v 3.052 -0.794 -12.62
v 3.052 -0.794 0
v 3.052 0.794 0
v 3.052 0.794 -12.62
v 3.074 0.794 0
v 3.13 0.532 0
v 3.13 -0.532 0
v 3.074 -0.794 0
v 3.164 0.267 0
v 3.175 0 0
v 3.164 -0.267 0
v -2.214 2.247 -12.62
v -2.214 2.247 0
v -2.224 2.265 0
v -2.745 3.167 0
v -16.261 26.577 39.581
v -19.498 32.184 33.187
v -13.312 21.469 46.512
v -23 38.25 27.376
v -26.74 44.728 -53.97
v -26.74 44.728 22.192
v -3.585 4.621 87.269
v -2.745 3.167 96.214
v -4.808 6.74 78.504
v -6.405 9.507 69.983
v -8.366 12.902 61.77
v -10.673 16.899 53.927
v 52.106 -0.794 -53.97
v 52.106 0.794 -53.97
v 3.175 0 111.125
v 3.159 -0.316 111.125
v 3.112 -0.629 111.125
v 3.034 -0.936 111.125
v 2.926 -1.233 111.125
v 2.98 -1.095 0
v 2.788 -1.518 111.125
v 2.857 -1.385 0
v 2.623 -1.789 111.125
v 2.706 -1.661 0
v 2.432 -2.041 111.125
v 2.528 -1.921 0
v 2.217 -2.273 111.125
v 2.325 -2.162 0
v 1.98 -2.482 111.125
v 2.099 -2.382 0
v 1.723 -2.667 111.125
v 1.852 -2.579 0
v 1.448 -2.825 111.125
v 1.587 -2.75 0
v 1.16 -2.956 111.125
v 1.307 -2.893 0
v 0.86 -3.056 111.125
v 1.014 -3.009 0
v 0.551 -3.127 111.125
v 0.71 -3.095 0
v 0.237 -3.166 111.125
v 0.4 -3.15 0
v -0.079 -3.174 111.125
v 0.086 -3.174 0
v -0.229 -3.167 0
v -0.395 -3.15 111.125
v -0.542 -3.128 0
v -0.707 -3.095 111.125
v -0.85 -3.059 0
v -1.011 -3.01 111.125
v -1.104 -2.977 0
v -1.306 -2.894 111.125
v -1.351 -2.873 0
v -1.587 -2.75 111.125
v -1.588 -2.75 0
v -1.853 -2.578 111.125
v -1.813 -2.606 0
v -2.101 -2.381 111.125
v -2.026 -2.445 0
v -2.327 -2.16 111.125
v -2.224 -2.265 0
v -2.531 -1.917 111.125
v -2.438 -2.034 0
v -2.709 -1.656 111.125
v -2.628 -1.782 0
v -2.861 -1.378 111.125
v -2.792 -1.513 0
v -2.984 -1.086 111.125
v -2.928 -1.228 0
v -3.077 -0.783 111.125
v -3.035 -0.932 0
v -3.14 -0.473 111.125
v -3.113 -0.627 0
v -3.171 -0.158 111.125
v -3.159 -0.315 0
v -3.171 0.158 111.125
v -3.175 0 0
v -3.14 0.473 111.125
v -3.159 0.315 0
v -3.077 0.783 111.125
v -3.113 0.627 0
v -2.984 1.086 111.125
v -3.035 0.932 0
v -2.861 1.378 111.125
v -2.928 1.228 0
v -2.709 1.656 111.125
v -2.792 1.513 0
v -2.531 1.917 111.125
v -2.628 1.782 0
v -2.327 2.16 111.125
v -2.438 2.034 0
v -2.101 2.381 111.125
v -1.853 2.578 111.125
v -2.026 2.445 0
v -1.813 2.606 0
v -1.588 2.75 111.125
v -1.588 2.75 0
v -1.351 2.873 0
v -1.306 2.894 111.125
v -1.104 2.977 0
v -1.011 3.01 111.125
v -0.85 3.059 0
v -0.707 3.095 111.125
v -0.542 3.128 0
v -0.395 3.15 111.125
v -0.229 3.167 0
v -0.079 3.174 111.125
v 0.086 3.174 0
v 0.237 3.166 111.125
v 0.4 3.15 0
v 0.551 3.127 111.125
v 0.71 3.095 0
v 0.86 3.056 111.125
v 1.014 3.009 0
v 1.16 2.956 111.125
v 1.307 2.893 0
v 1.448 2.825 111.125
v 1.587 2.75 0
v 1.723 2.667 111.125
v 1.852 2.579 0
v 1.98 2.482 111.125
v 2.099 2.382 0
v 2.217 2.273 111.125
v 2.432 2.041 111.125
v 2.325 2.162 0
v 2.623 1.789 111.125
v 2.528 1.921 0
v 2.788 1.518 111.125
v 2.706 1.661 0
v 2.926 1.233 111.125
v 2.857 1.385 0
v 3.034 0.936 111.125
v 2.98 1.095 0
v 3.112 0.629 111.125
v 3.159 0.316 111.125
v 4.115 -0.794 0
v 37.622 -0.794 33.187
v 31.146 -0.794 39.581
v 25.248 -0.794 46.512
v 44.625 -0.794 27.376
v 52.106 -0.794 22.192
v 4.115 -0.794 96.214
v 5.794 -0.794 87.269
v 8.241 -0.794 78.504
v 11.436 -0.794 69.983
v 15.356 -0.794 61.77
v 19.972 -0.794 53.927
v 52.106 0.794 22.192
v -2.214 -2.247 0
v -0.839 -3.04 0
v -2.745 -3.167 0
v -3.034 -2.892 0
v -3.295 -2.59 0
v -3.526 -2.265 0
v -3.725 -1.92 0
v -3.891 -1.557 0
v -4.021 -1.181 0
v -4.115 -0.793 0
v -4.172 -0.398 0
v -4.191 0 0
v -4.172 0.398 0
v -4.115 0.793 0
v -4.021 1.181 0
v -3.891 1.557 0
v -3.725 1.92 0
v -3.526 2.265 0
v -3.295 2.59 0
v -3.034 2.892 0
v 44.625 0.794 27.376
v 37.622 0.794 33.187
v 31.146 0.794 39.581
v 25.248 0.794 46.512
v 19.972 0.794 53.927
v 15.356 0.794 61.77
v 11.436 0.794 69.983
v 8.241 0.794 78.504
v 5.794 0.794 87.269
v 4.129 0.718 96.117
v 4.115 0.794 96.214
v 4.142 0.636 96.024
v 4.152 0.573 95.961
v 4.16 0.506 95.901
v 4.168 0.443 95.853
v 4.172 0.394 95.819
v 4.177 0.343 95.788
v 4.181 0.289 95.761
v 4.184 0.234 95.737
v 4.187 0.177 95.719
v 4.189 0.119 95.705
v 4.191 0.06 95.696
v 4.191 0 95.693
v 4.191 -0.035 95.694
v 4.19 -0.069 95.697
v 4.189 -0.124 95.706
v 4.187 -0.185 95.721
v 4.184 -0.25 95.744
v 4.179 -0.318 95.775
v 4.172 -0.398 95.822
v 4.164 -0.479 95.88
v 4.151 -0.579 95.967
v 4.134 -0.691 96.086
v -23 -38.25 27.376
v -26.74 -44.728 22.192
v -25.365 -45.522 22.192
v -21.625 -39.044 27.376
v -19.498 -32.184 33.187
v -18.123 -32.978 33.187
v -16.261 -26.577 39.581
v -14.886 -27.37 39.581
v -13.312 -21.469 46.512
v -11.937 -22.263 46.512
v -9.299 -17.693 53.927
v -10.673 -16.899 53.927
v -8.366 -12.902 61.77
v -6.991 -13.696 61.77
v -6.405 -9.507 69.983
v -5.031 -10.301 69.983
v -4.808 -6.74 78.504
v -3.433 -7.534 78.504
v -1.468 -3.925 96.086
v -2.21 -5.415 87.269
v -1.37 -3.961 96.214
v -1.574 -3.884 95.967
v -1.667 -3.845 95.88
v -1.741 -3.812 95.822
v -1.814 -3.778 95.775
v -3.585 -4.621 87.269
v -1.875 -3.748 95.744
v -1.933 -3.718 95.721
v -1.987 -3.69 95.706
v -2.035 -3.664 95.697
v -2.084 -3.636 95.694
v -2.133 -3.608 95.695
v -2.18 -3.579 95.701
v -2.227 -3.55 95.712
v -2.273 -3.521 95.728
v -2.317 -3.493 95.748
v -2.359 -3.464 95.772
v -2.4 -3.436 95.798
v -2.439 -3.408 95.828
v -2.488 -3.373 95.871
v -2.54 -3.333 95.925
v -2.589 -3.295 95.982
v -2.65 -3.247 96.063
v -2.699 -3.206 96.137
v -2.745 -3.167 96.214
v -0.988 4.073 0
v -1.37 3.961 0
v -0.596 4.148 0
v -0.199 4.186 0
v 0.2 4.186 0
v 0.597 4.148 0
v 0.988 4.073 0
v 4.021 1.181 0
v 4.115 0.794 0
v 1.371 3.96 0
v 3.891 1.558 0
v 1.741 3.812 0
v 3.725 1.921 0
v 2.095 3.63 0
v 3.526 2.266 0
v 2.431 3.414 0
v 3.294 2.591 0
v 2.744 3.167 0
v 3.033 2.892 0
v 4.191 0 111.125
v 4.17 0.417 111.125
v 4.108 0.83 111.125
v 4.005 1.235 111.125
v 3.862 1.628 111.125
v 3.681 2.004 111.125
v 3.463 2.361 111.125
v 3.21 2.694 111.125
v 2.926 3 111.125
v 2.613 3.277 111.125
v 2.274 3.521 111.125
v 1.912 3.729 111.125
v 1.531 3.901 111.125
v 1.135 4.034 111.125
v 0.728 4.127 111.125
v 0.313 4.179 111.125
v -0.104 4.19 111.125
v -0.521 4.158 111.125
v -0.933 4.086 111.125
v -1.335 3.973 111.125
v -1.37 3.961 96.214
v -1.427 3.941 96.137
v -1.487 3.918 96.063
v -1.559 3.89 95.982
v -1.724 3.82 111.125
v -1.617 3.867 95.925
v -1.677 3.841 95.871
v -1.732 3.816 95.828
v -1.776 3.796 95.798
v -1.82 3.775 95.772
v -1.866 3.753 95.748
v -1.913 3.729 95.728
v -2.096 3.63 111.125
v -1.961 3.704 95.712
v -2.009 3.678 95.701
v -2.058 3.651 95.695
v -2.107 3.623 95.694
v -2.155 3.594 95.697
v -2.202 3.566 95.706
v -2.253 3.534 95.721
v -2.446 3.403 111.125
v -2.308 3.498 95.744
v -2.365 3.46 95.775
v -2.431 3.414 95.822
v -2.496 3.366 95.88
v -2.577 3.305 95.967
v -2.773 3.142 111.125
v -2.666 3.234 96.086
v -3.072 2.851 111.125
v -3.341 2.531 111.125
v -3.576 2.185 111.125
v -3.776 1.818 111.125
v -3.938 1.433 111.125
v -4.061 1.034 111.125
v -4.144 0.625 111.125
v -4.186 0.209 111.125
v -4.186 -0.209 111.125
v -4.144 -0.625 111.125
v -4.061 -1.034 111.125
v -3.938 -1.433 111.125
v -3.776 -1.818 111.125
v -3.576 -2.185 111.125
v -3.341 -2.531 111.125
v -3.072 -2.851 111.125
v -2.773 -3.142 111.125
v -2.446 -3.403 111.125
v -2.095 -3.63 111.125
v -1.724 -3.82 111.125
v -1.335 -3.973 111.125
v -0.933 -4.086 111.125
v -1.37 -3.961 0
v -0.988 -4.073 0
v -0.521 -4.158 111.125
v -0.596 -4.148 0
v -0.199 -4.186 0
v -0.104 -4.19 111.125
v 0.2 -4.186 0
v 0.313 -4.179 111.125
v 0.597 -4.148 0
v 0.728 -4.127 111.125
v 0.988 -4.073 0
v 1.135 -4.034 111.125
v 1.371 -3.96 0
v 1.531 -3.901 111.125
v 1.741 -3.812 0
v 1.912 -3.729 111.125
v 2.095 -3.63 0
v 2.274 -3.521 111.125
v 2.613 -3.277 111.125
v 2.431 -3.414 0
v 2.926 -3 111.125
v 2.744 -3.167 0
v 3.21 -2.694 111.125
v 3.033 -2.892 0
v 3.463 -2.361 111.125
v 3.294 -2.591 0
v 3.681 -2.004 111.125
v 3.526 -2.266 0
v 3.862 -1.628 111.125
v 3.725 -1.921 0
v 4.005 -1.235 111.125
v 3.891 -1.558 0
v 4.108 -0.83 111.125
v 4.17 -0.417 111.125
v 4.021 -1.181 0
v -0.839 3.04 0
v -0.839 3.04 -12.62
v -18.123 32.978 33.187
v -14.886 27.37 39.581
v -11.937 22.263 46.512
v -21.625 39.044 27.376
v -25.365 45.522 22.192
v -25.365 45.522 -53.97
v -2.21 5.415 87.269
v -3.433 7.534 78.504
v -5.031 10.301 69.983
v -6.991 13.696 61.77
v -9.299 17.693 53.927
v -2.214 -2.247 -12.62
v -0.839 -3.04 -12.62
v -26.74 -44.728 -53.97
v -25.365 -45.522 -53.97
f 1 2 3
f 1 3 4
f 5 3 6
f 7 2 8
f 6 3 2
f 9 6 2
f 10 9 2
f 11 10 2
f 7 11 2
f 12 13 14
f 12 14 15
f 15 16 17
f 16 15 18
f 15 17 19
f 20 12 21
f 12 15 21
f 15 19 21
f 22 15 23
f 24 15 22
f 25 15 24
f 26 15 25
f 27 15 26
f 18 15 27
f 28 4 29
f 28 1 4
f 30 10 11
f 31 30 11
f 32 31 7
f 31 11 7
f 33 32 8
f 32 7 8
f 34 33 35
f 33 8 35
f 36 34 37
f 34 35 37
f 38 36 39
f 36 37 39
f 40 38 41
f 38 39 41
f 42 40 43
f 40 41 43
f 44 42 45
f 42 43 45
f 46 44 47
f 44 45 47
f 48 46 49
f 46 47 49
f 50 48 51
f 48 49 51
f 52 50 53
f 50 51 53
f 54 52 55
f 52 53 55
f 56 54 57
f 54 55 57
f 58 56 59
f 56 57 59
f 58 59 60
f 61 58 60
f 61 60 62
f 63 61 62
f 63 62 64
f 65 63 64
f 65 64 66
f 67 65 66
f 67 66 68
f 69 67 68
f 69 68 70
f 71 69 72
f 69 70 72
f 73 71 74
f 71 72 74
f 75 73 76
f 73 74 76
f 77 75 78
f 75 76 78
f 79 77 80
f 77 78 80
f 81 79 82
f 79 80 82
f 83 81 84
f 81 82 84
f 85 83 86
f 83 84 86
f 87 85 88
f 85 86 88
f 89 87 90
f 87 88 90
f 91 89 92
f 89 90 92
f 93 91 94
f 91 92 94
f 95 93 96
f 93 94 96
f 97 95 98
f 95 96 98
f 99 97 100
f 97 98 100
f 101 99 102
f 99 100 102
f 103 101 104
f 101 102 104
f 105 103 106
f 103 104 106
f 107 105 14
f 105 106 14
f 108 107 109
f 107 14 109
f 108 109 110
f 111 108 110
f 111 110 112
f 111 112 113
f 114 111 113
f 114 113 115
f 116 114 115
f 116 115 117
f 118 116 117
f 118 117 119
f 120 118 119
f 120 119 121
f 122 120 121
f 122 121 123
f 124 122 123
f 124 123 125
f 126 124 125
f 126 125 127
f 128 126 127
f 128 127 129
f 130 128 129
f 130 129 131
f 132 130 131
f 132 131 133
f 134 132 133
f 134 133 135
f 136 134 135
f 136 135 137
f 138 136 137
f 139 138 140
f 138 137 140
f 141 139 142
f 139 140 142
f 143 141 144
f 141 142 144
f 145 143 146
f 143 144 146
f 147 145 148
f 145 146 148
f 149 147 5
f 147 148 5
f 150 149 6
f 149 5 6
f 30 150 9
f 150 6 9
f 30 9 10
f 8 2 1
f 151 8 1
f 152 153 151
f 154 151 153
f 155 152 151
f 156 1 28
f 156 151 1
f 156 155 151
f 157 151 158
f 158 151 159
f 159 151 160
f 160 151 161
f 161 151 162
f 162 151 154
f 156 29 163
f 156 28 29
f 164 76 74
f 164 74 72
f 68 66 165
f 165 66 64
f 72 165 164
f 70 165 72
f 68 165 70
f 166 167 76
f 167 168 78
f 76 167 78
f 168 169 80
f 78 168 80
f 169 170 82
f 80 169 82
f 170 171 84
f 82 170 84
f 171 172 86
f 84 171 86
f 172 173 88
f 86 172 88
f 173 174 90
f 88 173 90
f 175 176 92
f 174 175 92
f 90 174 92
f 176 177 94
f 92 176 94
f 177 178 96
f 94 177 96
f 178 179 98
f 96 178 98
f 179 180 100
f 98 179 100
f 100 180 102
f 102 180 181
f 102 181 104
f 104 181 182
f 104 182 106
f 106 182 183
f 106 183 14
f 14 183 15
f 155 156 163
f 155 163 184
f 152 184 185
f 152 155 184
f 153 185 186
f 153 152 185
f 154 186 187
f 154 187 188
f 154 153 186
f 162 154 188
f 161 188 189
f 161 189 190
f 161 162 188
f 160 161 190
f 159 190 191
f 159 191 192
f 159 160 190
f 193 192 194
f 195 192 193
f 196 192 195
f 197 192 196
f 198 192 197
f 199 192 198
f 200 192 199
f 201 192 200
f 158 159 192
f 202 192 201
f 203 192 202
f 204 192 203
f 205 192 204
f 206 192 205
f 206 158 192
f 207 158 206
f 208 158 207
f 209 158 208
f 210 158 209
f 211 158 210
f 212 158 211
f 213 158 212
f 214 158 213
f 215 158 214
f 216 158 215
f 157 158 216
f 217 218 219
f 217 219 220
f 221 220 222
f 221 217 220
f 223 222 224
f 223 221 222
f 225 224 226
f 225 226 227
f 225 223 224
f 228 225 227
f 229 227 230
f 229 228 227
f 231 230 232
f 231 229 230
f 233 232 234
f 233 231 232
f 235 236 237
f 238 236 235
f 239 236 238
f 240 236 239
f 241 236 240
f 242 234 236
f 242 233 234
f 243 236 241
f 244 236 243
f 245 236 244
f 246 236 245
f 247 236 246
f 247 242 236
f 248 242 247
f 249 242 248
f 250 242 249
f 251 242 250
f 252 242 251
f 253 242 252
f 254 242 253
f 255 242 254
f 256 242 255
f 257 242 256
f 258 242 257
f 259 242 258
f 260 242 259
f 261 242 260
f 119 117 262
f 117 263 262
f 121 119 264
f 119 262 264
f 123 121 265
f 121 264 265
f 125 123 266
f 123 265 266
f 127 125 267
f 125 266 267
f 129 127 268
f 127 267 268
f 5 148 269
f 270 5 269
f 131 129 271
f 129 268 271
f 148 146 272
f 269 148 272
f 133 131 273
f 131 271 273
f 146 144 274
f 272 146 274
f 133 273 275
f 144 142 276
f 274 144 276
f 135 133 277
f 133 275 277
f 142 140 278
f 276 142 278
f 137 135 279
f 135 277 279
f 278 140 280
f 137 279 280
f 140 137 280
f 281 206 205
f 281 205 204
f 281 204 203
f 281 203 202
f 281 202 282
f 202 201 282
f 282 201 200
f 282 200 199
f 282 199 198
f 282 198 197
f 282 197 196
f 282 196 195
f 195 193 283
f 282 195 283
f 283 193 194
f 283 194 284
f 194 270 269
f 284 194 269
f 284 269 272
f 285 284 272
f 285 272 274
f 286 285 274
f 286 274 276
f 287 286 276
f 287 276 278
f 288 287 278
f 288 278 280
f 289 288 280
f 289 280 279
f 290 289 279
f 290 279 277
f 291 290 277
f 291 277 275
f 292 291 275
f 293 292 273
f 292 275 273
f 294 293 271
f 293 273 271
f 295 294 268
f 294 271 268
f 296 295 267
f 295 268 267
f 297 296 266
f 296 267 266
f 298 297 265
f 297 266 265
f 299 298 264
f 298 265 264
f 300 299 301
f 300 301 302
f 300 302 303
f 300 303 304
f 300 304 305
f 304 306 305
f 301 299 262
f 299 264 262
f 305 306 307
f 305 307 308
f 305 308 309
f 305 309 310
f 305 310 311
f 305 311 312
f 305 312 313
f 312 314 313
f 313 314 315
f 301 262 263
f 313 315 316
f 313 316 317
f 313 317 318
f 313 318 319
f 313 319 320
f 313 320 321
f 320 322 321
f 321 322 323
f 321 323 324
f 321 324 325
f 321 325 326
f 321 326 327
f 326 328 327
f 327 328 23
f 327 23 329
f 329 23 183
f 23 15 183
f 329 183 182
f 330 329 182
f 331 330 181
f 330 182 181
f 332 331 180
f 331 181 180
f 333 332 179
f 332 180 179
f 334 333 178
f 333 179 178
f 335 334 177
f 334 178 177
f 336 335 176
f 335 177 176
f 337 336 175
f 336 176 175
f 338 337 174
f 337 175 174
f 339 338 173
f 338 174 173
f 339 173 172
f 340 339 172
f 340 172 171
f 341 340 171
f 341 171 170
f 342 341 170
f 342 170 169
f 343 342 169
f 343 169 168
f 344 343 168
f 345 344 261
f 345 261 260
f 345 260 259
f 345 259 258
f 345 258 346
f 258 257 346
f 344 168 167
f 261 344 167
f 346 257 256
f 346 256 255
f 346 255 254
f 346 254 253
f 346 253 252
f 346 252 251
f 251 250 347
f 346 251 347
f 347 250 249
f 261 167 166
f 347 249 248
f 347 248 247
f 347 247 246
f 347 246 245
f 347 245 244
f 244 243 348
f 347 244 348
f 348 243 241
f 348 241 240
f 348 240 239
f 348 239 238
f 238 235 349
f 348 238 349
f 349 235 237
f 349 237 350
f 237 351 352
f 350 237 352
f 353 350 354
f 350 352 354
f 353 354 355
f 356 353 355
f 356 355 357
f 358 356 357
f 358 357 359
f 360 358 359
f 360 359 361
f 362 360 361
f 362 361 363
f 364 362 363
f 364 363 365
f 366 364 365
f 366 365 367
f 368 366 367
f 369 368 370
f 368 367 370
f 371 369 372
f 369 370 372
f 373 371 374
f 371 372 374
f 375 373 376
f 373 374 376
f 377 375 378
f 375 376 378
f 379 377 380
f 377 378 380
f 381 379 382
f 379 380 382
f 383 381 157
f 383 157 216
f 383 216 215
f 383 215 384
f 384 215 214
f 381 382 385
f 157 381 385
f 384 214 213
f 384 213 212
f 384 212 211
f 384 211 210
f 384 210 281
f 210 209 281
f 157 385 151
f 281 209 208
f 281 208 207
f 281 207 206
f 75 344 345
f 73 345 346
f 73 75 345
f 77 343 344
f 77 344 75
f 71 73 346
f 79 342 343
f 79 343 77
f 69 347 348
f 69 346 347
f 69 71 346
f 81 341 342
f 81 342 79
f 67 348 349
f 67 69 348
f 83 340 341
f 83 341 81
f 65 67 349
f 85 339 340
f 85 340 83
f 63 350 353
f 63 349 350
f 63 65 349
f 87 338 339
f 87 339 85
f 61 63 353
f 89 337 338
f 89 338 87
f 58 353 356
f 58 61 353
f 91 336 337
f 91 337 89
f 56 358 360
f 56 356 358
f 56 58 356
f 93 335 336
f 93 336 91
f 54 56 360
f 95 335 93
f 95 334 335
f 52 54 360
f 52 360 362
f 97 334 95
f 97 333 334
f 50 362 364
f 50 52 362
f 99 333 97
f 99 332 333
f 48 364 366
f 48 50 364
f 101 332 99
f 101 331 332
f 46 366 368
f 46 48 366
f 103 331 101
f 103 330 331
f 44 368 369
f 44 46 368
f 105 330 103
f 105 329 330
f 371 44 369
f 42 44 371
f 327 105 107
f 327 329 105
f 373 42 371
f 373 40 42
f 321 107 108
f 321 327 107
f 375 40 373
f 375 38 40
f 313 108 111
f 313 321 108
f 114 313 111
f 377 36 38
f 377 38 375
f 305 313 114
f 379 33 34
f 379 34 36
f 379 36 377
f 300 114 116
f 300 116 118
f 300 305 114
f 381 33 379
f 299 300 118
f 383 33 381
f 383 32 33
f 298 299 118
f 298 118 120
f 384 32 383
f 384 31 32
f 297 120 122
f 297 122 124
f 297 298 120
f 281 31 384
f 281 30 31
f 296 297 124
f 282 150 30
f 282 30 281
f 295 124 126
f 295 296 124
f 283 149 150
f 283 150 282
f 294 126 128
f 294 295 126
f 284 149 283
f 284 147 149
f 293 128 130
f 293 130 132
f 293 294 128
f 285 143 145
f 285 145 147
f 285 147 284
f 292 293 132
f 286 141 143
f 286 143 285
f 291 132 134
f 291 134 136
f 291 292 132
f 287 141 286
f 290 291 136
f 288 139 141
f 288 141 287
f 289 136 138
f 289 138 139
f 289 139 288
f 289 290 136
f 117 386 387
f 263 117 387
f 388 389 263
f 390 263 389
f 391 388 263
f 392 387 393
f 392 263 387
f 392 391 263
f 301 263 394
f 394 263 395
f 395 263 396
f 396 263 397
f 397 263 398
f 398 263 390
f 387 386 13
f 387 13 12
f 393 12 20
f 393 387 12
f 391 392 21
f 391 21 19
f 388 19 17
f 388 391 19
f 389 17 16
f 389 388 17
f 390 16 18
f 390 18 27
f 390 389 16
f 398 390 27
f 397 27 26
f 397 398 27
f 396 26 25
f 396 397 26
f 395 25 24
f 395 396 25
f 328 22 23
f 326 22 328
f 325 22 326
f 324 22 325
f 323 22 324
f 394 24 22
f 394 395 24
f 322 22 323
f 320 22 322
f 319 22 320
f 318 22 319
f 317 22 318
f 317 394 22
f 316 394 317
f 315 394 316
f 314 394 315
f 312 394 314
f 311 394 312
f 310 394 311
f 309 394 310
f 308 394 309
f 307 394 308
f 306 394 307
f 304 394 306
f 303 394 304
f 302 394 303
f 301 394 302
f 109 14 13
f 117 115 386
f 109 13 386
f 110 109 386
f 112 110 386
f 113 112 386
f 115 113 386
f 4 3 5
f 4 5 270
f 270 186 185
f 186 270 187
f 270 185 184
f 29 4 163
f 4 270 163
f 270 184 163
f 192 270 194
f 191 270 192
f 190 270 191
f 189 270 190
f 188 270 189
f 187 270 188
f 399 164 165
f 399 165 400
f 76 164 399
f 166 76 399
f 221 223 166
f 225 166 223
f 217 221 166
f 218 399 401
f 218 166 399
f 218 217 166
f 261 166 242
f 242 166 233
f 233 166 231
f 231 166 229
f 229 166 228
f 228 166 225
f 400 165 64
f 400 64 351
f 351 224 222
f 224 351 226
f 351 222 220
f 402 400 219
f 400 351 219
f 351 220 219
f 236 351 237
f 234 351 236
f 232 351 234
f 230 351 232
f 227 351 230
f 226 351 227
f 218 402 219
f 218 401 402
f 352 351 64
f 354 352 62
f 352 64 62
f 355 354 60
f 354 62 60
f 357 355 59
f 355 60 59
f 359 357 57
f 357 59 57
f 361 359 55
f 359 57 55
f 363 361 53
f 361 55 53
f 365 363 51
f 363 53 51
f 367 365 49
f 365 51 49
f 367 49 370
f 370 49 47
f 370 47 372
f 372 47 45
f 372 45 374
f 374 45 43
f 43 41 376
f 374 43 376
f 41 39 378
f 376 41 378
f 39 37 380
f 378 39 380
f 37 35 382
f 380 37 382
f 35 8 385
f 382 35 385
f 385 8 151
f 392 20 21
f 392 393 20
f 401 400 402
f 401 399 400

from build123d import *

# Parameters (mm, degrees)
F0_R          = 4.191
F0_R_2        = 2.921
F1_DEPTH      = 111.125
F3_DEPTH      = 0.79375
F3_DEPTH_BACK = 0.79375
F4_COUNT      = 3
F5_D          = 6.35
F5_DEPTH      = 111.1260001


# Not quite as in the source:
# - a length typed as a fraction of an inch, garbled in the dataset ("3 / 203.2 mm" for 3/8 in), is restored


with BuildPart() as f1:
    # F0 (on Top) → F1 (new body)
    with BuildSketch(Plane.XY):
        Circle(F0_R)
        Circle(F0_R_2, mode=Mode.SUBTRACT)
    extrude(amount=F1_DEPTH)

    # F2 (on Front) → F3 (join, two sides)
    with BuildSketch(Plane.XZ) as f3_sk:
        with BuildLine():
            ThreePointArc((52.1055692807, 22.1924969852), (16.1288428569, 60.3431066176), (3.05240741, 111.125))
            Line((3.05240741, 111.125), (3.05240741, -12.6199012697))
            Line((3.05240741, -12.6199012697), (52.1055692807, -12.6199012697))
            Line((52.1055692807, -12.6199012697), (52.1055692807, 22.1924969852))
        make_face()
        Polygon((52.1055692807, -12.6199012697), (3.05240741, -12.6199012697), (52.1055692807, -53.9700498879), align=None)
    extrude(amount=F3_DEPTH)
    extrude(f3_sk.sketch, amount=-F3_DEPTH_BACK)

    # F4: F1 ×3 about axis
    f4_axis = Axis((0, 0, 24.9059423804), (0, 0, -1))


with BuildPart() as f1_1:
    add(f1.part)
    for i in range(1, F4_COUNT):
        add(f1.part.rotate(f4_axis, i * 360 / F4_COUNT))

    # F5 (through all, one way)
    with BuildSketch(Plane(origin=(0, 0, 0), x_dir=(1, 0, 0), z_dir=(0, 0, -1))):
        with Locations((0, 0)):
            Circle(F5_D / 2)
    extrude(amount=-F5_DEPTH, mode=Mode.SUBTRACT)


solid = f1_1.part
